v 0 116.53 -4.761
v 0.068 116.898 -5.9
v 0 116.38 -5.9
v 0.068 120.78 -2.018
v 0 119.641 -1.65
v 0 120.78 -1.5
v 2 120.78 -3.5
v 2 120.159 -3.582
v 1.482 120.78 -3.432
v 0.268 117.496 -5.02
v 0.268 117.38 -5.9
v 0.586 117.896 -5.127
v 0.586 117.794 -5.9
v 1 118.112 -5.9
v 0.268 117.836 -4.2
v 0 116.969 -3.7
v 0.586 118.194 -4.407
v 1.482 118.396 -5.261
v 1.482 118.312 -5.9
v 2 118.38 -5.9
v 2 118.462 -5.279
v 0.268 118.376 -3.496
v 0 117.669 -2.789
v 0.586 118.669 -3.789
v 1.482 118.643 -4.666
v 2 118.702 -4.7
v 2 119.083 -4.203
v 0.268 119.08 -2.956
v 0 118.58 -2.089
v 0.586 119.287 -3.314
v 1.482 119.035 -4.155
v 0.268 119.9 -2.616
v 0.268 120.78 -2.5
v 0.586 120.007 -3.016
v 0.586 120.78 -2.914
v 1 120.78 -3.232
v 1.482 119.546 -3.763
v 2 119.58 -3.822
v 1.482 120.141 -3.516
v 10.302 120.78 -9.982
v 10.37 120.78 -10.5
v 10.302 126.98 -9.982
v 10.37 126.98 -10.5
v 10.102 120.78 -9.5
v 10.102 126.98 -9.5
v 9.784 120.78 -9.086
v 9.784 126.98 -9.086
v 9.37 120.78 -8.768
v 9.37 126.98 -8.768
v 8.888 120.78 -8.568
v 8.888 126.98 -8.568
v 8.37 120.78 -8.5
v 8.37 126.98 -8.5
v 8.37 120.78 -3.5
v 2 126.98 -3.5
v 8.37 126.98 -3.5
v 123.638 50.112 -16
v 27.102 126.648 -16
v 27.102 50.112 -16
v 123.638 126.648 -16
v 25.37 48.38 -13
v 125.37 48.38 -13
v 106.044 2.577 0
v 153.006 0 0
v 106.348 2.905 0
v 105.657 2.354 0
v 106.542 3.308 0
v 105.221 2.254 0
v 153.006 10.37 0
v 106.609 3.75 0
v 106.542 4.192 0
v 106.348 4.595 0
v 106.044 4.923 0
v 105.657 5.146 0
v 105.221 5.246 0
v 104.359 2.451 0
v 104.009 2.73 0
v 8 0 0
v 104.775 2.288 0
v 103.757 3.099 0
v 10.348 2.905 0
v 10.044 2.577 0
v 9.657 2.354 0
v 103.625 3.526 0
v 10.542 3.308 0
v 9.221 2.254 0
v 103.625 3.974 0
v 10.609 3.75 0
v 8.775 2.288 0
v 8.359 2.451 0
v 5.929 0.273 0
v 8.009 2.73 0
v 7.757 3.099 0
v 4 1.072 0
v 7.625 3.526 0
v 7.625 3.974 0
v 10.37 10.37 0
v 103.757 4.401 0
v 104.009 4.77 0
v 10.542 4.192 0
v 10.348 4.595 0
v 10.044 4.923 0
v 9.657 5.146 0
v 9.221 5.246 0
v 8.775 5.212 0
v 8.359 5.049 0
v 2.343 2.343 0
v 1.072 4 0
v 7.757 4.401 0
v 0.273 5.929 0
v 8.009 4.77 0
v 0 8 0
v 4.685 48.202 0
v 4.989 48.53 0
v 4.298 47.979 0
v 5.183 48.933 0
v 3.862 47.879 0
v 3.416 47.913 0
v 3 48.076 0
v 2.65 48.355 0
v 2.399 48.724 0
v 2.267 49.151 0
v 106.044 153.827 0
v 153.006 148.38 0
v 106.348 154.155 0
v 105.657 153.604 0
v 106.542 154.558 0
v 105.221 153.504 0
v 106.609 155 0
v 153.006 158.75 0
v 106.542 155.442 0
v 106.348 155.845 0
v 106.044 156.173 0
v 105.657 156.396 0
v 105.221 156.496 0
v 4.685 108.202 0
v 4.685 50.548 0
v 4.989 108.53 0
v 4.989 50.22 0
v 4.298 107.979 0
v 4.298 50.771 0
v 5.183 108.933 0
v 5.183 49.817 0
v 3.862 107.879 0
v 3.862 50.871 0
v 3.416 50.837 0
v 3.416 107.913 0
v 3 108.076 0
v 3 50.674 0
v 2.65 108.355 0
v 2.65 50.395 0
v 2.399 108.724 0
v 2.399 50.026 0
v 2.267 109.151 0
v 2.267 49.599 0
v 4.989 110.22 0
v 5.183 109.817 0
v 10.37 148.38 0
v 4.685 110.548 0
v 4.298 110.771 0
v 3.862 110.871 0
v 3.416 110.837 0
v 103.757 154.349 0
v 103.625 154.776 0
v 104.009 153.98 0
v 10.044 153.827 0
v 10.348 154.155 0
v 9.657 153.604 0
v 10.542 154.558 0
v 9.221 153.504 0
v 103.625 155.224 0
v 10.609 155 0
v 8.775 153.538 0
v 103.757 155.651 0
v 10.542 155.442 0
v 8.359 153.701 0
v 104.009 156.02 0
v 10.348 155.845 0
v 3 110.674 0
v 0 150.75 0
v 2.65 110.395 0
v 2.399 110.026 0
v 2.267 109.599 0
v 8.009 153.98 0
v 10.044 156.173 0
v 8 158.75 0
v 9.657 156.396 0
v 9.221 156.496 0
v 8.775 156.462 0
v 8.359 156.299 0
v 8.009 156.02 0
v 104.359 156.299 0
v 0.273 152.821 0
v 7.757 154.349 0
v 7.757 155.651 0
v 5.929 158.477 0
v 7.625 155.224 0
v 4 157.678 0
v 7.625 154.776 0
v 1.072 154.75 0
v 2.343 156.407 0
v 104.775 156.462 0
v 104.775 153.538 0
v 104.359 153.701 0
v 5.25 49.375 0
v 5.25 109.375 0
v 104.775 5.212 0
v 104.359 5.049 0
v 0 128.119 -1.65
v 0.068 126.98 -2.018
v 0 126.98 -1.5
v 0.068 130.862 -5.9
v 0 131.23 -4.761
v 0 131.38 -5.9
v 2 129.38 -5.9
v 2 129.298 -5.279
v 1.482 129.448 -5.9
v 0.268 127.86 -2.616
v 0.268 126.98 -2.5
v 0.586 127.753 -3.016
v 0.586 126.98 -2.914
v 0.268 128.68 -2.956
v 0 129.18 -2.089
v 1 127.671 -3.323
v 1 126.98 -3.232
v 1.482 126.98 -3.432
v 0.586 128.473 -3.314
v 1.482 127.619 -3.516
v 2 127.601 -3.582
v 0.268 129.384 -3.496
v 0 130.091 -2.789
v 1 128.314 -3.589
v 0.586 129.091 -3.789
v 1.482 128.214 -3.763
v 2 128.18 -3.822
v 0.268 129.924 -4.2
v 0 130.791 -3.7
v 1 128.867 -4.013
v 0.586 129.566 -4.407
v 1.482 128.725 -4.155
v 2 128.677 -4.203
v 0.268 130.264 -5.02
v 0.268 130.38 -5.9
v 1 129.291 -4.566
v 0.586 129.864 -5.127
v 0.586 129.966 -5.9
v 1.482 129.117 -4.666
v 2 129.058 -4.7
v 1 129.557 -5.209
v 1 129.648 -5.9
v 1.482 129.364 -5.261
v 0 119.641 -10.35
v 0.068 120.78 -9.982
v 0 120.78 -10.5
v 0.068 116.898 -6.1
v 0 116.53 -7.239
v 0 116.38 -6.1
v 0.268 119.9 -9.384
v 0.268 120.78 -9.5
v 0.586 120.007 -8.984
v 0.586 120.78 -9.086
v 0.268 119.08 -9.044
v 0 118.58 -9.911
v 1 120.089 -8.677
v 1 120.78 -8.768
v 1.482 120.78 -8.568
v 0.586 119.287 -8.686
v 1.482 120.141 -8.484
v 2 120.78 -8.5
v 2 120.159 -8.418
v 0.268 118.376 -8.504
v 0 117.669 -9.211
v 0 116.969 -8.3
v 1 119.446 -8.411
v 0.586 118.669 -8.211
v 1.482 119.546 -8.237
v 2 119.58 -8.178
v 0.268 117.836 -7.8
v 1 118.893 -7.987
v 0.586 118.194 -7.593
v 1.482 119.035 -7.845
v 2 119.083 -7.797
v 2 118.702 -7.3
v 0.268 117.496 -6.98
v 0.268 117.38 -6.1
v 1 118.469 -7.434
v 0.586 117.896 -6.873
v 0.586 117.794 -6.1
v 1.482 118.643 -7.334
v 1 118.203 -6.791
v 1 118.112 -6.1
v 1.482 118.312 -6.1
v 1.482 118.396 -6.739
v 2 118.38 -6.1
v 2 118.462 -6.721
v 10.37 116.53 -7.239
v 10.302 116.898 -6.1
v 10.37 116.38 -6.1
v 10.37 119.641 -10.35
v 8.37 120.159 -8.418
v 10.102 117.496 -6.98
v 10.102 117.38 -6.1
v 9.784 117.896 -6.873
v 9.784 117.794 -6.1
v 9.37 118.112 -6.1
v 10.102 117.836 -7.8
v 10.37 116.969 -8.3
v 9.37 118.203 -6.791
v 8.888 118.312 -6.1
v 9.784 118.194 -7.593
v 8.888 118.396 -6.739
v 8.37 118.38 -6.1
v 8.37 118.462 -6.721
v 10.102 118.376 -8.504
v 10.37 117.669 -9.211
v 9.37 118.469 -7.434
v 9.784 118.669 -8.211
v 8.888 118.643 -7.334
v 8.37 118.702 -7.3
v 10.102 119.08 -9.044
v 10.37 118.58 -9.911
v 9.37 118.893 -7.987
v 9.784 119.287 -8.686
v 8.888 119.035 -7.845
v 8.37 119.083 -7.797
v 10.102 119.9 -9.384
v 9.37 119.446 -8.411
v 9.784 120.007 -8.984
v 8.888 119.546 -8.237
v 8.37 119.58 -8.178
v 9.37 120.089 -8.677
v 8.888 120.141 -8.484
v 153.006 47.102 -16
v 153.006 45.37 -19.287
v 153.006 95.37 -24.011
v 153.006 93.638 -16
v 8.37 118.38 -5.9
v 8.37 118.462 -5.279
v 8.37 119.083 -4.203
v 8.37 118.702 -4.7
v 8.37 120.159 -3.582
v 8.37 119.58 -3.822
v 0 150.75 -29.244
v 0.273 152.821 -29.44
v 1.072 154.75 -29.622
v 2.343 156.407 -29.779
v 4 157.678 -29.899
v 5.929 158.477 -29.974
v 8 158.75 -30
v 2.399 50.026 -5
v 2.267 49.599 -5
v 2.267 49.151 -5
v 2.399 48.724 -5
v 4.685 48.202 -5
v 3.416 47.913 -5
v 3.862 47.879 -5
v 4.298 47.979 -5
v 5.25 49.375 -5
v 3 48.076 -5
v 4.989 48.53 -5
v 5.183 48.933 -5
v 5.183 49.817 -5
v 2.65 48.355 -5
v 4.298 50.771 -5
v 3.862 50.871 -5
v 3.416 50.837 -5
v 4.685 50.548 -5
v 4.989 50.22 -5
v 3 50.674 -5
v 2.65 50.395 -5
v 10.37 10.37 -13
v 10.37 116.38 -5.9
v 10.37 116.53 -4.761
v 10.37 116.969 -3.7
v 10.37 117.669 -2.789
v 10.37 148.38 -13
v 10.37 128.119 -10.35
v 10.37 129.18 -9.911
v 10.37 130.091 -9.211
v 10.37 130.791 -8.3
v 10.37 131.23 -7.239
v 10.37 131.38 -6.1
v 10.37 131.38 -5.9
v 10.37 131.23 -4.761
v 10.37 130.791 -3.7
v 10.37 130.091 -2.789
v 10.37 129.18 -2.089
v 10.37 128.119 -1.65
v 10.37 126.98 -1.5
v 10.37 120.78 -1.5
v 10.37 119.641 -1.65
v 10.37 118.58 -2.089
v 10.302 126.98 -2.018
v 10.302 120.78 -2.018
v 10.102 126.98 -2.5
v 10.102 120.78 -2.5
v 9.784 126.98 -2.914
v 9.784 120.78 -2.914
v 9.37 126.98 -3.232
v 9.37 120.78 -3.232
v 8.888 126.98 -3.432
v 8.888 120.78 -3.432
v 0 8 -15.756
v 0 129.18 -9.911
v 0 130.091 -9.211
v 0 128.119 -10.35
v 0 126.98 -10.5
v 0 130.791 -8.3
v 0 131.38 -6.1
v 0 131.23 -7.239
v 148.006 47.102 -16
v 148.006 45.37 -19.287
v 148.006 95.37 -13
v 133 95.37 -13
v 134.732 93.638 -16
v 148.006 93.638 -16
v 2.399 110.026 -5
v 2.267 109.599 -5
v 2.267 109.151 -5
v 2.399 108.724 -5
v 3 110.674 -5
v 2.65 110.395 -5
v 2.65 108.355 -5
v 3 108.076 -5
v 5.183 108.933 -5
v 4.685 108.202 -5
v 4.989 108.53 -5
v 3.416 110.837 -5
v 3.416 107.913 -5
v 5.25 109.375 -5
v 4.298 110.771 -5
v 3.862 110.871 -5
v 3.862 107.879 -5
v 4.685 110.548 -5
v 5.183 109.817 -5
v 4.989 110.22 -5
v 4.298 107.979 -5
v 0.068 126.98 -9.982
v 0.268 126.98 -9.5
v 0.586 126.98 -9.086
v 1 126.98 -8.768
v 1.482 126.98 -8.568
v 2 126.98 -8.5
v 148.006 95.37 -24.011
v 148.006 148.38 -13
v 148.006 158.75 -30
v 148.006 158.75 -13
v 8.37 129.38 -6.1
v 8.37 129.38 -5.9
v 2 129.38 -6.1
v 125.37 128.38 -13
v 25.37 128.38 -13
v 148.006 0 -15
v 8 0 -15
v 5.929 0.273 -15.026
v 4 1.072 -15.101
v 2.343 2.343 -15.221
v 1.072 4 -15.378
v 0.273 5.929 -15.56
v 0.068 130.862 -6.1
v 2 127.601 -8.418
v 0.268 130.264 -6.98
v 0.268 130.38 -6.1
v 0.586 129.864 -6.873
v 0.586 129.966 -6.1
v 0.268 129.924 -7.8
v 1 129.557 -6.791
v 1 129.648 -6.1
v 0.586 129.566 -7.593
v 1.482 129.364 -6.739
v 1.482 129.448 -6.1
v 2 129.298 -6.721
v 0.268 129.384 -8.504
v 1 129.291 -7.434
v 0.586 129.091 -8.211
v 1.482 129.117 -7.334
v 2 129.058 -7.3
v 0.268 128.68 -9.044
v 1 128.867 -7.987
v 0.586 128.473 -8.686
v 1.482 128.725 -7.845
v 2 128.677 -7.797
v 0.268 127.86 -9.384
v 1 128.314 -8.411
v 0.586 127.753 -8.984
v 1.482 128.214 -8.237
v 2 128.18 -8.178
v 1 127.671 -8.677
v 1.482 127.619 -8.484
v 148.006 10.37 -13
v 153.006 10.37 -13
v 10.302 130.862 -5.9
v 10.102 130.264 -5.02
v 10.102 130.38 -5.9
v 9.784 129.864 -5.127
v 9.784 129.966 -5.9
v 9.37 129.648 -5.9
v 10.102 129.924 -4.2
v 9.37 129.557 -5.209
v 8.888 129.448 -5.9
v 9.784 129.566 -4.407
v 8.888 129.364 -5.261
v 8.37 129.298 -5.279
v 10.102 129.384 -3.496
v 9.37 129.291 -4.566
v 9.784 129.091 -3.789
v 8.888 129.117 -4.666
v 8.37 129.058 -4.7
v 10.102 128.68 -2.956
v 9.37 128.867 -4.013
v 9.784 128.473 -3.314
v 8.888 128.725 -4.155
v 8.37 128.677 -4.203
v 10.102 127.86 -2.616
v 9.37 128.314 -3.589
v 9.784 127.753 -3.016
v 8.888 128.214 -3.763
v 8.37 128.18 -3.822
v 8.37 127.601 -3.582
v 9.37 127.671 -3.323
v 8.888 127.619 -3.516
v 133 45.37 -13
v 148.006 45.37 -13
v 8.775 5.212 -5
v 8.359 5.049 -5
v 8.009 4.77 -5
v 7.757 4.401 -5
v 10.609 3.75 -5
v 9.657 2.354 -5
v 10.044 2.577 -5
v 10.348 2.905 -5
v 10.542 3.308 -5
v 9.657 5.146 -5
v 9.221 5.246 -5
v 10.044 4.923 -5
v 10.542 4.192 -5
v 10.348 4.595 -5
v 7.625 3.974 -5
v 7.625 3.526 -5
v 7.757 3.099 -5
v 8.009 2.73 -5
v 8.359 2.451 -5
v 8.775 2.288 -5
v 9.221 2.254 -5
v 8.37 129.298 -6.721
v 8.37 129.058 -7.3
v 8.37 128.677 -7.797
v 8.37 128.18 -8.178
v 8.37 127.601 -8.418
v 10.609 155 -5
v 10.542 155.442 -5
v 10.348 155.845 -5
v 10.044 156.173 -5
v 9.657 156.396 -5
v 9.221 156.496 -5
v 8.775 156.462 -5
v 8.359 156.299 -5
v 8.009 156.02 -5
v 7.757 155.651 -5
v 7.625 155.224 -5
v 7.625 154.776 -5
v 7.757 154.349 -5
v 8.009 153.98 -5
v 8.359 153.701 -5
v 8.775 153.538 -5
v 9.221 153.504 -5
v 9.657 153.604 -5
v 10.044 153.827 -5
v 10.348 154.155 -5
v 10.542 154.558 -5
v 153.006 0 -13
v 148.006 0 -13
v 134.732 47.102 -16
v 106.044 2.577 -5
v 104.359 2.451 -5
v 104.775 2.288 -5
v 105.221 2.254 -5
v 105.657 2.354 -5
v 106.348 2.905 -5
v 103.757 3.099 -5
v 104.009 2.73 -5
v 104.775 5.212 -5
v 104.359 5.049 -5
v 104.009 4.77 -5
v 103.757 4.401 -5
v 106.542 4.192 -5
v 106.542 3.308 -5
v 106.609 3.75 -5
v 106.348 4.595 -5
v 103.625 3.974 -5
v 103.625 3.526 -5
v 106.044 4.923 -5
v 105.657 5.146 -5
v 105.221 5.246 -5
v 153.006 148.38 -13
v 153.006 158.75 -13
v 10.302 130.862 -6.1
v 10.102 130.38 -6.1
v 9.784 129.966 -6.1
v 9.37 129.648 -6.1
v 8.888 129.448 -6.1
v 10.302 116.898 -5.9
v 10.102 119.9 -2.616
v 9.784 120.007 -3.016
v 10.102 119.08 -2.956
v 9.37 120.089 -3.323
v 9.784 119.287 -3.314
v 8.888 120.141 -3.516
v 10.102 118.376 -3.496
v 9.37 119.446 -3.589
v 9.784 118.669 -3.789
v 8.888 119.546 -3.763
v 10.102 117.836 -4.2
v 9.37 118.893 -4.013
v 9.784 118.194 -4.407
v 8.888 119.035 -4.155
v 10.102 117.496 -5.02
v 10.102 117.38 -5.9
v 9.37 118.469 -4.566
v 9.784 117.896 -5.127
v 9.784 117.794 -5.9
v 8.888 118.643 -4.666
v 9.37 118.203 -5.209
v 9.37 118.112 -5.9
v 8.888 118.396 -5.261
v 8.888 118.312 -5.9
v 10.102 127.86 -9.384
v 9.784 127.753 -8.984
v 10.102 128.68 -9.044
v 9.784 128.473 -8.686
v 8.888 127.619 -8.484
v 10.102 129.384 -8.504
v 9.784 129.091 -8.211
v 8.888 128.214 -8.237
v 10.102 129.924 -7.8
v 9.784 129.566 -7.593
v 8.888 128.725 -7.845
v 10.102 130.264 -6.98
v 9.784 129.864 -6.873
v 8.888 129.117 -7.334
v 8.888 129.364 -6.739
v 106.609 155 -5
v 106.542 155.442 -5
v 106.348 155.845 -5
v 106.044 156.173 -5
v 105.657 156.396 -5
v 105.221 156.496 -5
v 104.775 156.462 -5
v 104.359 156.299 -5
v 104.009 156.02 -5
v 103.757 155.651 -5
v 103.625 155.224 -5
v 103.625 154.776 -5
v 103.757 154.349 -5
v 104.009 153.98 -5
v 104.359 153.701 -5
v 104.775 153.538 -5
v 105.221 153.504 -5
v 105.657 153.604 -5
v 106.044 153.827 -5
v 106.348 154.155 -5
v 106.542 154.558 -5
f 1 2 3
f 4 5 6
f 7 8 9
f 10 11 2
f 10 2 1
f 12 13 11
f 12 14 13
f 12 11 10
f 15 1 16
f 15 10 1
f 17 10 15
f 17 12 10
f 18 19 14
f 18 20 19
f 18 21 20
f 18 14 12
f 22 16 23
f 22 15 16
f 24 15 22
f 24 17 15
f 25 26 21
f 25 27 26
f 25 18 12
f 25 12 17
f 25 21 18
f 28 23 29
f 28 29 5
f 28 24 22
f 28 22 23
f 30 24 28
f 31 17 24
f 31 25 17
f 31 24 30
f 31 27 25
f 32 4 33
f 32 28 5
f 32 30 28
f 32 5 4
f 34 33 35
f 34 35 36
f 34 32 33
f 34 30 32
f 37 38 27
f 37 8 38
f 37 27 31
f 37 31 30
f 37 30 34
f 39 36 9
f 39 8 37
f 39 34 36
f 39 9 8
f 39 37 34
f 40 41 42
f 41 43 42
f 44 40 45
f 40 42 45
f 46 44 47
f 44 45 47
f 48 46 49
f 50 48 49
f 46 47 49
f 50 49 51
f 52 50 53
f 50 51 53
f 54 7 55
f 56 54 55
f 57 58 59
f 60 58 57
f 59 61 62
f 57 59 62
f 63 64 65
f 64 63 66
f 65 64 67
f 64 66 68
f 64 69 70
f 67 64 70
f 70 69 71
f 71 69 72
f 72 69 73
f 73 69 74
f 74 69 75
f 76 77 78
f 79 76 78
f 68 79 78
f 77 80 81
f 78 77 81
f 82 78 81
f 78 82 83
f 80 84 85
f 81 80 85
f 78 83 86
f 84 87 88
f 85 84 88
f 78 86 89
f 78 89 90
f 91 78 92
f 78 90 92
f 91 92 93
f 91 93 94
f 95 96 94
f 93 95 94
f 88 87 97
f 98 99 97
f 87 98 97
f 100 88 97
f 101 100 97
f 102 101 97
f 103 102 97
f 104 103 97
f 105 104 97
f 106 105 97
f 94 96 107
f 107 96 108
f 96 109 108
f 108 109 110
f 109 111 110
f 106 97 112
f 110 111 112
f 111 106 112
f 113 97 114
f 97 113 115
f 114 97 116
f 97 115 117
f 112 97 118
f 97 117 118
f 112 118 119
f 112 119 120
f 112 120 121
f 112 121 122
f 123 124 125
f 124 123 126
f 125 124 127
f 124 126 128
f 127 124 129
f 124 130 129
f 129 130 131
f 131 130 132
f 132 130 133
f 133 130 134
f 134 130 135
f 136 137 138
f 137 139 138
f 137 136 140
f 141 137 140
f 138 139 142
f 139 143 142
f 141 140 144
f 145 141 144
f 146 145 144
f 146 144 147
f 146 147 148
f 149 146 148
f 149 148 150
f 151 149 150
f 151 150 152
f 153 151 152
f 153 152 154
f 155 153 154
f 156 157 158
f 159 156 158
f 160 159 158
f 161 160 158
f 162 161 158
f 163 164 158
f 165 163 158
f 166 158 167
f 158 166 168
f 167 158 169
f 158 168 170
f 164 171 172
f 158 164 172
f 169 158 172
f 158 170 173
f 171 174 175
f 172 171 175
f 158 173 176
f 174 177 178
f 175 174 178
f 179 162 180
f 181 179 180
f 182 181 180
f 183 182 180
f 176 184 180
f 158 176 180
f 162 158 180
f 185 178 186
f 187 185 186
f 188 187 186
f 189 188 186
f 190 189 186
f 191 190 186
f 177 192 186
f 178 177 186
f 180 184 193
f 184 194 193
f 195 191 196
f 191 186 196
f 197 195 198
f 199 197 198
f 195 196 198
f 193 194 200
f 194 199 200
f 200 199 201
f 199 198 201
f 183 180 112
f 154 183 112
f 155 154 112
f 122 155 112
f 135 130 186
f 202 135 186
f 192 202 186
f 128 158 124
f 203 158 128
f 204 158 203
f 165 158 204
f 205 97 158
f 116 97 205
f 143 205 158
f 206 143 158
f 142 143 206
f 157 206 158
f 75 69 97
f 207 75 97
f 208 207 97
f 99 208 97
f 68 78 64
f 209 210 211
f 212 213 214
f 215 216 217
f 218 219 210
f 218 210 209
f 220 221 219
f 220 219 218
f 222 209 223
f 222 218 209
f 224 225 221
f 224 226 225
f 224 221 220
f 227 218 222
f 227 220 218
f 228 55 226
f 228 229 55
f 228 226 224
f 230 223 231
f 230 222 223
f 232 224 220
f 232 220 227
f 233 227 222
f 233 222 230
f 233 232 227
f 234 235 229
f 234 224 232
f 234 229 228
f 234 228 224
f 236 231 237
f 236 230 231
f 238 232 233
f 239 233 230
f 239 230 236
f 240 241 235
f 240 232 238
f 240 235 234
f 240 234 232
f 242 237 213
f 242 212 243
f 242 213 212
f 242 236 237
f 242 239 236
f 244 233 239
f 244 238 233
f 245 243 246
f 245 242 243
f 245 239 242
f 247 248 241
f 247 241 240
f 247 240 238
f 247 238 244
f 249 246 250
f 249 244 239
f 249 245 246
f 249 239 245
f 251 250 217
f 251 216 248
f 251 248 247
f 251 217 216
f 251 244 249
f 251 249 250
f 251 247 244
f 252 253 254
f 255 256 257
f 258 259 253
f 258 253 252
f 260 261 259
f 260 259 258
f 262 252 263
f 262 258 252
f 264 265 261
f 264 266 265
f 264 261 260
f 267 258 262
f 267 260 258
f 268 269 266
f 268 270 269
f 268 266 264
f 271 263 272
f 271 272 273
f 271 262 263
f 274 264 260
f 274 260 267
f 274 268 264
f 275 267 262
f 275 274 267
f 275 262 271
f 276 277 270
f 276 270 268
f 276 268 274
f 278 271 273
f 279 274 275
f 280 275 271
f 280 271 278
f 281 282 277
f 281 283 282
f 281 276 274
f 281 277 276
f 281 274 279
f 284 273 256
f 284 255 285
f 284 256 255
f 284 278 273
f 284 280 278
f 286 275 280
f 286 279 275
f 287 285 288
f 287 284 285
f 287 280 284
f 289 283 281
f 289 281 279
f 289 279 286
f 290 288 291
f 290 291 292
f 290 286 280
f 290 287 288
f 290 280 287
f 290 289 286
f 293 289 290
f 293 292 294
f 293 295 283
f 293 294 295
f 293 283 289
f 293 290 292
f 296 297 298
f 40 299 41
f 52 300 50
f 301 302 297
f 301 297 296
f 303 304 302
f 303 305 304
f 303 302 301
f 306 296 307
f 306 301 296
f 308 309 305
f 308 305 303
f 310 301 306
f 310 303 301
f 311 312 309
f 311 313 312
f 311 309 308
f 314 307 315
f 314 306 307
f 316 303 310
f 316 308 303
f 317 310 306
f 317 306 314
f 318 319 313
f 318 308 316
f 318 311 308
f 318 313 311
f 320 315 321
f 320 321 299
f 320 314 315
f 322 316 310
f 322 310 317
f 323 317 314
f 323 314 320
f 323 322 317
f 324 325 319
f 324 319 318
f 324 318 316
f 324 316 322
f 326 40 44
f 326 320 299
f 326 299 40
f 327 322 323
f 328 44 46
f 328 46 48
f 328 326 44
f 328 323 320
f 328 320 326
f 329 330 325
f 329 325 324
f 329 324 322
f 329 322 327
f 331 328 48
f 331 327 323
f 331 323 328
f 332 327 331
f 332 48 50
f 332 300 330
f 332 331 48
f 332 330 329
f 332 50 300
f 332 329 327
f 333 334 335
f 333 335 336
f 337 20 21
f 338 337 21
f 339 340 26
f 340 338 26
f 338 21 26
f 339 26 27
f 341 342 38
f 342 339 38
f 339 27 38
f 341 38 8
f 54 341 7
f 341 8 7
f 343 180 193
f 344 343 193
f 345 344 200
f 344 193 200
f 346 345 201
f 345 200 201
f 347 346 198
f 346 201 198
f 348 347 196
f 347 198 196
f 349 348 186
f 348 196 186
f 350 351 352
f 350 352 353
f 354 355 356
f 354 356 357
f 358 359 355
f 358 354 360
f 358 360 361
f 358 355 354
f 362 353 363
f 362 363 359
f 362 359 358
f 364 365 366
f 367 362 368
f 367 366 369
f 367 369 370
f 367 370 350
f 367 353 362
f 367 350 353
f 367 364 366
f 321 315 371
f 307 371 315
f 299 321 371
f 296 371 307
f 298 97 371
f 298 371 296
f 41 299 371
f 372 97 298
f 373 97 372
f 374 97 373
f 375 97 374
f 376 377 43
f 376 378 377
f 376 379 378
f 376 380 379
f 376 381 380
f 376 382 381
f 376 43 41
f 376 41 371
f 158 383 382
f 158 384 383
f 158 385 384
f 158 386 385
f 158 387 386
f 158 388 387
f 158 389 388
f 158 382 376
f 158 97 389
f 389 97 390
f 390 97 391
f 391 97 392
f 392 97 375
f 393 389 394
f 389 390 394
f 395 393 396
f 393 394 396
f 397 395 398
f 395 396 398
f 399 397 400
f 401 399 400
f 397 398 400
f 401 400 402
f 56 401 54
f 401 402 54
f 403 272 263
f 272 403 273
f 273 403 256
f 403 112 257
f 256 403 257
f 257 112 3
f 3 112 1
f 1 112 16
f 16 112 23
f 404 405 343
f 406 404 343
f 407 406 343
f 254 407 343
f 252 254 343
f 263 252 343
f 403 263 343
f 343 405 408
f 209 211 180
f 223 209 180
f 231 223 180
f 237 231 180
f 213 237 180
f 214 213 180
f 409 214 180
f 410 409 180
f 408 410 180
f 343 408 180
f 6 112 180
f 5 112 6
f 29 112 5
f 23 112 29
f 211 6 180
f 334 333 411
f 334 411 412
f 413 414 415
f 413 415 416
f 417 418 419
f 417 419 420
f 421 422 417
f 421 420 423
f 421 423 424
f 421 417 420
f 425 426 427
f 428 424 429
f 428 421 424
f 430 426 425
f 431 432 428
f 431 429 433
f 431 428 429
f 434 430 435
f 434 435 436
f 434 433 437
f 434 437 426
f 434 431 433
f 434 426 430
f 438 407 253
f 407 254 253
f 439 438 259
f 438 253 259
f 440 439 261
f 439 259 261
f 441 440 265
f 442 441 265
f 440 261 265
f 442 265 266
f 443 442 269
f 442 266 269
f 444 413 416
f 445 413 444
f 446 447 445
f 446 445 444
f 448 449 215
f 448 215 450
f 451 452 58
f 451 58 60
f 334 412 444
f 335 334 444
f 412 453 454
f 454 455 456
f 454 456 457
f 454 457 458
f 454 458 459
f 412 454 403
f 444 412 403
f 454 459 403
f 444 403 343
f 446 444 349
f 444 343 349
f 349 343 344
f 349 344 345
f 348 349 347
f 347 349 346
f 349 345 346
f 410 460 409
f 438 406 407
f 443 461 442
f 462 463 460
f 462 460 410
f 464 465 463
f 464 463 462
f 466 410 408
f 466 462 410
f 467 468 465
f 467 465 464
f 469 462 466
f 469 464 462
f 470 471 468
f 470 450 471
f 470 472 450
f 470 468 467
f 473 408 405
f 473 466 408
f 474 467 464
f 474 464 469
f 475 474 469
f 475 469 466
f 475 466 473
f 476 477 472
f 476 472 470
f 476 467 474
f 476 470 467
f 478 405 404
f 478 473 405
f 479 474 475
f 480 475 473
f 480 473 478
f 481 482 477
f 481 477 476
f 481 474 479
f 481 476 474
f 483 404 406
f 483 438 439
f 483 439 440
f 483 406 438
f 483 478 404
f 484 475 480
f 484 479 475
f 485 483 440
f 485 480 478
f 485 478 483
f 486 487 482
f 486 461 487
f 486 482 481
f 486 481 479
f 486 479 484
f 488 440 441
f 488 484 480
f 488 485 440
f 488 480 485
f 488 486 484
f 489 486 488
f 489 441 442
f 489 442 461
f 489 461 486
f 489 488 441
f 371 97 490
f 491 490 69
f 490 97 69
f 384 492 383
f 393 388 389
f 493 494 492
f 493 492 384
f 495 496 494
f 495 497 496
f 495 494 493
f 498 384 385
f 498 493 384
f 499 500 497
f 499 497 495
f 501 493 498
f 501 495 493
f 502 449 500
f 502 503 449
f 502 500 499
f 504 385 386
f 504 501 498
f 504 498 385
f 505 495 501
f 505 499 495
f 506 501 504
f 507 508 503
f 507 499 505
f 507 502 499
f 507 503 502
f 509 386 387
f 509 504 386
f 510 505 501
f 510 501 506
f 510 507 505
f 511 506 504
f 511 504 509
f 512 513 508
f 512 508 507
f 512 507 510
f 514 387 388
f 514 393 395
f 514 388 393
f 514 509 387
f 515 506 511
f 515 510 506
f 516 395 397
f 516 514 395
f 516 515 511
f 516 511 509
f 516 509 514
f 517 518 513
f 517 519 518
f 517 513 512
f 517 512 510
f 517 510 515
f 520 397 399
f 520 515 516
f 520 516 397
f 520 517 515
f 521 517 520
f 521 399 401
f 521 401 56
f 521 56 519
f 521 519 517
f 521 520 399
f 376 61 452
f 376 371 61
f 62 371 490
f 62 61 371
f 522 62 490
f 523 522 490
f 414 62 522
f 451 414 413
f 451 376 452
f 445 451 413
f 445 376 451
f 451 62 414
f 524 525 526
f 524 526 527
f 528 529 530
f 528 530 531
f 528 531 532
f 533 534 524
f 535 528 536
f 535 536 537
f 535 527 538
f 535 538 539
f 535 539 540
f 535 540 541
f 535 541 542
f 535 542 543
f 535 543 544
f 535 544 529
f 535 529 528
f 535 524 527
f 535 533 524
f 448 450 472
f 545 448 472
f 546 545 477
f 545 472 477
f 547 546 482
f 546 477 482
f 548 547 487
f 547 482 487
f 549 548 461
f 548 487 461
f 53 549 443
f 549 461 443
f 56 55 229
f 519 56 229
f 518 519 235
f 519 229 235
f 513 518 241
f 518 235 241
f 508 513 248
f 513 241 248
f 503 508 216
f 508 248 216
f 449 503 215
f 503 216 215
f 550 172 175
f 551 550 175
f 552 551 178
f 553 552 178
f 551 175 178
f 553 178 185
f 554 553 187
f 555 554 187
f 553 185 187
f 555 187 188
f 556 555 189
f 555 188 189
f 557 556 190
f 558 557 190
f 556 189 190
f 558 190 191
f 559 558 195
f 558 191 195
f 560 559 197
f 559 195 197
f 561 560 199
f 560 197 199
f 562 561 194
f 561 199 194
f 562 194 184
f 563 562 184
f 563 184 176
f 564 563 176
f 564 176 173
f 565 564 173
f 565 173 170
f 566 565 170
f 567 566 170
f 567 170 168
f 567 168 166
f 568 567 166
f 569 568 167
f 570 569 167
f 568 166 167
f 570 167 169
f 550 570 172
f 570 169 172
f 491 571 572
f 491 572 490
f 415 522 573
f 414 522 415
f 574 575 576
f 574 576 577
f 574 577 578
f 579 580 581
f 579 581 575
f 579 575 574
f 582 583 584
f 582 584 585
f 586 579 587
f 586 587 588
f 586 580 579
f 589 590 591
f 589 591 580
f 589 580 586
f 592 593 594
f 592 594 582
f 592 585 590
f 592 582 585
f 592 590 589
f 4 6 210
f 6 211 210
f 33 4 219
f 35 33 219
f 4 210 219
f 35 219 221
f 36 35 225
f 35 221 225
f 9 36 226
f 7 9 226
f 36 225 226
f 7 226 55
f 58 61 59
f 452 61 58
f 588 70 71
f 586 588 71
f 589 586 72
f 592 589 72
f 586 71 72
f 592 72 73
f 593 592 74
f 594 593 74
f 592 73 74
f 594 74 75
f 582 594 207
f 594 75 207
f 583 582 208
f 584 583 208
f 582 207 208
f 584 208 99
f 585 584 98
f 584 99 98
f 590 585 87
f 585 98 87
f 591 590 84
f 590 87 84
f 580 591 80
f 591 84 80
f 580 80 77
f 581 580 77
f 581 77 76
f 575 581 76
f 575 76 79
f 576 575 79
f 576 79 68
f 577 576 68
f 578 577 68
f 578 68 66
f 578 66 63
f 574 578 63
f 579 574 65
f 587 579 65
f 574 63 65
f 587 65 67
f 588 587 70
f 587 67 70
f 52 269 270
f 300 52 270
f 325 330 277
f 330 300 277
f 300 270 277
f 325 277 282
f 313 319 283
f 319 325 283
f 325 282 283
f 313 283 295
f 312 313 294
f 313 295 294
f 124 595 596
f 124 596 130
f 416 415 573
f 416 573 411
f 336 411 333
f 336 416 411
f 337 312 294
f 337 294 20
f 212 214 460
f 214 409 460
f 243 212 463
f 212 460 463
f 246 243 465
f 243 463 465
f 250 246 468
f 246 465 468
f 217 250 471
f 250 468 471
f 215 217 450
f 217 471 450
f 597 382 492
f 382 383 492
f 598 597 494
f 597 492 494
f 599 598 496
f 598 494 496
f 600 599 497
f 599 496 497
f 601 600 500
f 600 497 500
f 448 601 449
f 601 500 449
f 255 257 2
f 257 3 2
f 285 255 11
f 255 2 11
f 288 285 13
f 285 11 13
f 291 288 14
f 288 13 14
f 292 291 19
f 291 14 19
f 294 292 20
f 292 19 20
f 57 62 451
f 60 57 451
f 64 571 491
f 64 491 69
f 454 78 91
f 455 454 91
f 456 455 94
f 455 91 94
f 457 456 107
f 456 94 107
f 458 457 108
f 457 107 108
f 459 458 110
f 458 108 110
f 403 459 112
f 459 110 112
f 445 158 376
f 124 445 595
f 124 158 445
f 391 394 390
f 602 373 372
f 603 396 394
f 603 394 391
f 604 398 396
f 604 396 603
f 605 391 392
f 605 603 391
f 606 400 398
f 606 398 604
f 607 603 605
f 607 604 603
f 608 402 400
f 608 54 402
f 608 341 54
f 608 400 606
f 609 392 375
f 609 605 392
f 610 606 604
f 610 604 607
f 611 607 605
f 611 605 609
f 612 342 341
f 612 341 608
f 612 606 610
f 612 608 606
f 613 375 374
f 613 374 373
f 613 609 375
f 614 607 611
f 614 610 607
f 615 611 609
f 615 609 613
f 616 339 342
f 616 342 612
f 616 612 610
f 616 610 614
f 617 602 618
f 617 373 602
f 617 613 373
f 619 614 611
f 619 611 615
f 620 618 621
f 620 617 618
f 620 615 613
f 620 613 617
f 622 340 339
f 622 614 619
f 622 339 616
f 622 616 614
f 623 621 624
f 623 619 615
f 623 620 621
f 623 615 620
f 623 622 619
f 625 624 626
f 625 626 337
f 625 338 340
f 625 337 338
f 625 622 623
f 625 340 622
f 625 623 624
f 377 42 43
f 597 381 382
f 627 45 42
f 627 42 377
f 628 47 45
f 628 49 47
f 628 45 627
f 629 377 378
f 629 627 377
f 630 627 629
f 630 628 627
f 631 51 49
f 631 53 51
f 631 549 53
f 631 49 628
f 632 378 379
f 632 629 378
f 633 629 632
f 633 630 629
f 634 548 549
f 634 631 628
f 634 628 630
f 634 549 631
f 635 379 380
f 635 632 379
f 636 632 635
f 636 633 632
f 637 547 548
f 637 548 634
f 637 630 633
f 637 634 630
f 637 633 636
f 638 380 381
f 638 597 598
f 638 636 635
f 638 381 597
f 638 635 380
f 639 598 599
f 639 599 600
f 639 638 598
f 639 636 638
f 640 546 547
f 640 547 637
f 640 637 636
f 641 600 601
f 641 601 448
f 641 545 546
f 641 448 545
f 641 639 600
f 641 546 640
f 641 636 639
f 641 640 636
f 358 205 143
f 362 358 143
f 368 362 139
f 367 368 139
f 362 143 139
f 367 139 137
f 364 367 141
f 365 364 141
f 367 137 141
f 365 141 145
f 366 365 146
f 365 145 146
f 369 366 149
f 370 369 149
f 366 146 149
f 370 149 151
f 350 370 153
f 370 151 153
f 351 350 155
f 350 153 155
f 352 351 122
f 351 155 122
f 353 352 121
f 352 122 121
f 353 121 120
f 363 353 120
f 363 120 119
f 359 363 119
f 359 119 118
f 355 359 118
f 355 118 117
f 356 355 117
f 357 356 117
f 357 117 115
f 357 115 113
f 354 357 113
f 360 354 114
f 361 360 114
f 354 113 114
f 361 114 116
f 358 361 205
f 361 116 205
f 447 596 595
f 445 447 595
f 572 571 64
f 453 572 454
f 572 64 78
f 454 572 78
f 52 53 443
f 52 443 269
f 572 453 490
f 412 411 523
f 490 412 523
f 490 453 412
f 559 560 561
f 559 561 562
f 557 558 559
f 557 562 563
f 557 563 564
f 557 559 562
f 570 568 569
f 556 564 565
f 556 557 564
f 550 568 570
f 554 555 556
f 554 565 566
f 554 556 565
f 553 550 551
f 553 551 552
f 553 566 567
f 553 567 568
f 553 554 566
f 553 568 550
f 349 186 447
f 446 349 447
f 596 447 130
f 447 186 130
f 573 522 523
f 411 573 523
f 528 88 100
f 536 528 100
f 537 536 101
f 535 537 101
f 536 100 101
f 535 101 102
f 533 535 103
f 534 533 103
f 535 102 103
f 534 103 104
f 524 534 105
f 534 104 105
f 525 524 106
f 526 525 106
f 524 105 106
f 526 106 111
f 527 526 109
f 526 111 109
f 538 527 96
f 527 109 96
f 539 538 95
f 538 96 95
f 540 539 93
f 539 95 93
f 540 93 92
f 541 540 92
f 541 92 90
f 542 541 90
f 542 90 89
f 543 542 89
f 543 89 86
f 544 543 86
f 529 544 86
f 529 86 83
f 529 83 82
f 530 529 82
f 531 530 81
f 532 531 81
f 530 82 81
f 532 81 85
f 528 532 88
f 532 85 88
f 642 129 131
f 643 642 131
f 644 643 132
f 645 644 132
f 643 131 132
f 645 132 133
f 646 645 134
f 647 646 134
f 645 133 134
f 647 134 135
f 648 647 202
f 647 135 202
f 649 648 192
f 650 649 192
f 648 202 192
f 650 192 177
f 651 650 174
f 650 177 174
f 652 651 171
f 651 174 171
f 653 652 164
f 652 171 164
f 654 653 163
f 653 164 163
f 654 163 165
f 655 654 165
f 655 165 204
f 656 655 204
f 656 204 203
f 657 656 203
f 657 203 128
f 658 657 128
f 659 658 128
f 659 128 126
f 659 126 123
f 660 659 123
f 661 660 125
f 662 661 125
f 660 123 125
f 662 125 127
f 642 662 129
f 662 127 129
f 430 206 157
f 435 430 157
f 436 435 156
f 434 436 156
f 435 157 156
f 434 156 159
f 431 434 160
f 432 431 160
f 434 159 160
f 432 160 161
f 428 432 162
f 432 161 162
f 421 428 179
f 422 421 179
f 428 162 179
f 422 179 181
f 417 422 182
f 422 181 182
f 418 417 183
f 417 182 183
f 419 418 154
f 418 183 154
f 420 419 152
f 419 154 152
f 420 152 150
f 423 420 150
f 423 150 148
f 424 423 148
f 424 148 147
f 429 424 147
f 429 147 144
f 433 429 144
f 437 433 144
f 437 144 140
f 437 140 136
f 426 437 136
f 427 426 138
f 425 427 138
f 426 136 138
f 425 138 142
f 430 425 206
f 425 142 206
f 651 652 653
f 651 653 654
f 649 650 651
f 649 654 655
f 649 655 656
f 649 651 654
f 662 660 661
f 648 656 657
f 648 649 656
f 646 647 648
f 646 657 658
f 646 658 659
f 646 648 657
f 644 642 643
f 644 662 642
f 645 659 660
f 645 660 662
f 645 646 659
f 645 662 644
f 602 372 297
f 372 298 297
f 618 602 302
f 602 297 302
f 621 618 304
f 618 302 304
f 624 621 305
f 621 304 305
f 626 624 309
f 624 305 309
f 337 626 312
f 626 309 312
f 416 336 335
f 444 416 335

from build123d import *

# Parameters (mm, degrees)
EXTRUDE_1_DEPTH      = 30
SKETCH_2_R           = 1.5
CUT_EXTRUDE_1_DEPTH  = 5
CUT_EXTRUDE_4_DEPTH  = 307
SKETCH_3_W           = 285.26
SKETCH_3_H           = 138.01
CUT_EXTRUDE_5_DEPTH  = 13
SKETCH_12_W          = 40
SKETCH_12_H          = 50
CUT_EXTRUDE_7_DEPTH  = 3
CUT_EXTRUDE_7_DRAFT  = -30
SKETCH_9_W           = 100
SKETCH_9_H           = 80
CUT_EXTRUDE_8_DEPTH  = 3
CUT_EXTRUDE_8_DRAFT  = -30
CUT_EXTRUDE_9_DEPTH  = 11
FILLET_1_R           = 2
CUT_EXTRUDE_10_DEPTH = 11
FILLET_2_R           = 2
FILLET_3_R           = 2
FILLET_4_R           = 2
CUT_EXTRUDE_11_DEPTH = 5


with BuildPart() as part:
    # Model → 凸台-拉伸1 (new body)
    with BuildSketch(Plane.XY):
        with BuildLine():
            Line((0, 11), (0, 150.75))
            ThreePointArc((0, 150.75), (2.343145751, 156.406854249), (8, 158.75))
            Line((8, 158.75), (298.011203897, 158.75))
            ThreePointArc((298.011203897, 158.75), (303.664092807, 156.410816811), (306.011196041, 150.761211743))
            Line((306.011196041, 150.761211743), (306.207051361, 11.011211743))
            Line((306.207051361, 11.011211743), (306.207051361, 8))
            ThreePointArc((306.207051361, 8), (303.863905611, 2.343145751), (298.207051361, 0))
            Line((298.207051361, 0), (8, 0))
            ThreePointArc((8, 0), (2.343145751, 2.343145751), (0, 8))
            Line((0, 8), (0, 11))
        make_face()
    extrude(amount=-EXTRUDE_1_DEPTH)

    # 草图2 → 切除-拉伸1 (cut)
    with BuildSketch(Plane.XY):
        with Locations((105.108569936, 3.75)):
            Circle(SKETCH_2_R)
        with Locations((9.108569936, 3.75)):
            Circle(SKETCH_2_R)
        with Locations((201.10846029, 3.817270412)):
            Circle(SKETCH_2_R)
        with Locations((297.108366012, 3.951811323)):
            Circle(SKETCH_2_R)
        with Locations((105.108569936, 155)):
            Circle(SKETCH_2_R)
        with Locations((9.108569936, 155)):
            Circle(SKETCH_2_R)
        with Locations((201.10846029, 154.932729588)):
            Circle(SKETCH_2_R)
        with Locations((297.108366012, 154.798188677)):
            Circle(SKETCH_2_R)
        with Locations((3.75, 109.375)):
            Circle(SKETCH_2_R)
        with Locations((3.75, 49.375)):
            Circle(SKETCH_2_R)
        with Locations((302.318900647, 109.584217456)):
            Circle(SKETCH_2_R)
        with Locations((302.402988717, 49.58427638)):
            Circle(SKETCH_2_R)
    extrude(amount=-CUT_EXTRUDE_1_DEPTH, mode=Mode.SUBTRACT)

    # 草图6 → 切除-拉伸4 (cut)
    with BuildSketch(Plane.ZY):
        Polygon((-30, 158.75), (-30, 0), (-15, 0), align=None)
    extrude(amount=-CUT_EXTRUDE_4_DEPTH, mode=Mode.SUBTRACT)

    # 草图3 → 切除-拉伸5 (cut)
    with BuildSketch(Plane.XY):
        with Locations((153, 79.375)):
            Rectangle(SKETCH_3_W, SKETCH_3_H)
    extrude(amount=-CUT_EXTRUDE_5_DEPTH, mode=Mode.SUBTRACT)


with BuildPart() as cut_extrude_7_tool:
    # 草图12 → 切除-拉伸7 (with draft: the straight prism first)
    with BuildSketch(Plane.XY.offset(-13)):
        with Locations((153, 70.37)):
            Rectangle(SKETCH_12_W, SKETCH_12_H)
    extrude(amount=-CUT_EXTRUDE_7_DEPTH)
    # 切除-拉伸7: the draft: its side faces are tilted about the plane it starts from
    cut_extrude_7_sides = [cut_extrude_7_tool.faces().sort_by_distance(p)[0] for p in [
        (153, 45.37, -14.5),
        (173, 70.37, -14.5),
        (153, 95.37, -14.5),
        (133, 70.37, -14.5),
    ]]
    draft(cut_extrude_7_sides, Plane.XY.offset(-13), CUT_EXTRUDE_7_DRAFT)


with BuildPart() as part_1:
    add(part.part)

    # 切除-拉伸7: cut by cut_extrude_7_tool
    add(cut_extrude_7_tool.part, mode=Mode.SUBTRACT)


with BuildPart() as cut_extrude_8_tool:
    # 草图9 → 切除-拉伸8 (with draft: the straight prism first)
    with BuildSketch(Plane.XY.offset(-13)):
        with Locations((75.37, 88.38)):
            Rectangle(SKETCH_9_W, SKETCH_9_H)
    extrude(amount=-CUT_EXTRUDE_8_DEPTH)
    # 切除-拉伸8: the draft: its side faces are tilted about the plane it starts from
    cut_extrude_8_sides = [cut_extrude_8_tool.faces().sort_by_distance(p)[0] for p in [
        (25.37, 88.38, -14.5),
        (75.37, 48.38, -14.5),
        (125.37, 88.38, -14.5),
        (75.37, 128.38, -14.5),
    ]]
    draft(cut_extrude_8_sides, Plane.XY.offset(-13), CUT_EXTRUDE_8_DRAFT)


with BuildPart() as part_2:
    add(part_1.part)

    # 切除-拉伸8: cut by cut_extrude_8_tool
    add(cut_extrude_8_tool.part, mode=Mode.SUBTRACT)

    # 草图14 → 切除-拉伸9 (cut)
    with BuildSketch(Plane.ZY):
        with BuildLine():
            Line((-5.9, 129.38), (-6.1, 129.38))
            ThreePointArc((-6.1, 129.38), (-7.797056275, 128.677056275), (-8.5, 126.98))
            Line((-8.5, 126.98), (-8.5, 120.78))
            ThreePointArc((-8.5, 120.78), (-7.797056275, 119.082943725), (-6.1, 118.38))
            Line((-6.1, 118.38), (-5.9, 118.38))
            ThreePointArc((-5.9, 118.38), (-4.202943725, 119.082943725), (-3.5, 120.78))
            Line((-3.5, 120.78), (-3.5, 126.98))
            ThreePointArc((-3.5, 126.98), (-4.202943725, 128.677056275), (-5.9, 129.38))
        make_face()
    extrude(amount=-CUT_EXTRUDE_9_DEPTH, mode=Mode.SUBTRACT)

    # 圆角1
    fillet_1_edges = [part_2.edges().sort_by_distance(p)[0] for p in [
        (0, 123.88, -3.5),
        (0, 118.38, -6),
        (0, 119.082943725, -7.797056275),
        (0, 128.677056275, -7.797056275),
        (0, 128.677056275, -4.202943725),
        (0, 129.38, -6),
        (0, 123.88, -8.5),
        (0, 119.082943725, -4.202943725),
    ]]
    fillet(fillet_1_edges, radius=FILLET_1_R)

    # 草图15 → 切除-拉伸10 (cut)
    with BuildSketch(Plane.XZ):
        with BuildLine():
            Line((222.53, -3.959687417), (229.73, -3.959687417))
            ThreePointArc((229.73, -3.959687417), (231.427056275, -4.662631142), (232.13, -6.359687417))
            Line((232.13, -6.359687417), (232.13, -6.559687417))
            ThreePointArc((232.13, -6.559687417), (231.427056275, -8.256743692), (229.73, -8.959687417))
            Line((229.73, -8.959687417), (222.53, -8.959687417))
            ThreePointArc((222.53, -8.959687417), (220.832943725, -8.256743692), (220.13, -6.559687417))
            Line((220.13, -6.559687417), (220.13, -6.359687417))
            ThreePointArc((220.13, -6.359687417), (220.832943725, -4.662631142), (222.53, -3.959687417))
        make_face()
    extrude(amount=-CUT_EXTRUDE_10_DEPTH, mode=Mode.SUBTRACT)

    # 圆角2
    fillet_2_edges = [part_2.edges().sort_by_distance(p)[0] for p in [
        (226.13, 0, -3.959687417),
        (232.13, 0, -6.459687417),
        (231.427056275, 0, -8.256743692),
        (220.832943725, 0, -4.662631142),
        (220.13, 0, -6.459687417),
        (220.832943725, 0, -8.256743692),
        (226.13, 0, -8.959687417),
        (231.427056275, 0, -4.662631142),
    ]]
    fillet(fillet_2_edges, radius=FILLET_2_R)

    # 圆角3
    fillet_3_edges = [part_2.edges().sort_by_distance(p)[0] for p in [
        (10.37, 129.38, -6),
        (10.37, 128.677056275, -7.797056275),
        (10.37, 123.88, -8.5),
        (10.37, 119.082943725, -7.797056275),
        (10.37, 118.38, -6),
        (10.37, 119.082943725, -4.202943725),
        (10.37, 123.88, -3.5),
        (10.37, 128.677056275, -4.202943725),
    ]]
    fillet(fillet_3_edges, radius=FILLET_3_R)

    # 圆角4
    fillet_4_edges = [part_2.edges().sort_by_distance(p)[0] for p in [
        (220.13, 10.37, -6.459687417),
        (220.832943725, 10.37, -8.256743692),
        (226.13, 10.37, -8.959687417),
        (231.427056275, 10.37, -8.256743692),
        (232.13, 10.37, -6.459687417),
        (231.427056275, 10.37, -4.662631142),
        (226.13, 10.37, -3.959687417),
        (220.832943725, 10.37, -4.662631142),
    ]]
    fillet(fillet_4_edges, radius=FILLET_4_R)


with BuildPart() as body_2:
    # Split Bodies 1: the piece on the far side of the plane
    add(part_2.part)
    split(bisect_by=Plane(origin=(153.005601949, 0, 0), x_dir=(0, 0, 1), z_dir=(1, 0, 0)), keep=Keep.BOTTOM)

    # 草图19 → 切除-拉伸11 (cut)
    with BuildSketch(Plane(origin=(153.005601949, 0, 0), x_dir=(0, 0, -1), z_dir=(1, 0, 0))):
        Polygon((13, 148.38), (13, 95.37), (16, 93.637949192), (24.011338583, 95.37), (30, 158.75), (13, 158.75), align=None)
        Polygon((19.286929134, 45.37), (15, 0), (13, 0), (13, 45.37), (16, 47.102050808), align=None)
    extrude(amount=-CUT_EXTRUDE_11_DEPTH, mode=Mode.SUBTRACT)


with BuildPart() as part_3:
    add(part_2.part)

    # Split Bodies 1
    split(bisect_by=Plane(origin=(153.005601949, 0, 0), x_dir=(0, 0, 1), z_dir=(1, 0, 0)), keep=Keep.TOP)


solid = body_2.part
